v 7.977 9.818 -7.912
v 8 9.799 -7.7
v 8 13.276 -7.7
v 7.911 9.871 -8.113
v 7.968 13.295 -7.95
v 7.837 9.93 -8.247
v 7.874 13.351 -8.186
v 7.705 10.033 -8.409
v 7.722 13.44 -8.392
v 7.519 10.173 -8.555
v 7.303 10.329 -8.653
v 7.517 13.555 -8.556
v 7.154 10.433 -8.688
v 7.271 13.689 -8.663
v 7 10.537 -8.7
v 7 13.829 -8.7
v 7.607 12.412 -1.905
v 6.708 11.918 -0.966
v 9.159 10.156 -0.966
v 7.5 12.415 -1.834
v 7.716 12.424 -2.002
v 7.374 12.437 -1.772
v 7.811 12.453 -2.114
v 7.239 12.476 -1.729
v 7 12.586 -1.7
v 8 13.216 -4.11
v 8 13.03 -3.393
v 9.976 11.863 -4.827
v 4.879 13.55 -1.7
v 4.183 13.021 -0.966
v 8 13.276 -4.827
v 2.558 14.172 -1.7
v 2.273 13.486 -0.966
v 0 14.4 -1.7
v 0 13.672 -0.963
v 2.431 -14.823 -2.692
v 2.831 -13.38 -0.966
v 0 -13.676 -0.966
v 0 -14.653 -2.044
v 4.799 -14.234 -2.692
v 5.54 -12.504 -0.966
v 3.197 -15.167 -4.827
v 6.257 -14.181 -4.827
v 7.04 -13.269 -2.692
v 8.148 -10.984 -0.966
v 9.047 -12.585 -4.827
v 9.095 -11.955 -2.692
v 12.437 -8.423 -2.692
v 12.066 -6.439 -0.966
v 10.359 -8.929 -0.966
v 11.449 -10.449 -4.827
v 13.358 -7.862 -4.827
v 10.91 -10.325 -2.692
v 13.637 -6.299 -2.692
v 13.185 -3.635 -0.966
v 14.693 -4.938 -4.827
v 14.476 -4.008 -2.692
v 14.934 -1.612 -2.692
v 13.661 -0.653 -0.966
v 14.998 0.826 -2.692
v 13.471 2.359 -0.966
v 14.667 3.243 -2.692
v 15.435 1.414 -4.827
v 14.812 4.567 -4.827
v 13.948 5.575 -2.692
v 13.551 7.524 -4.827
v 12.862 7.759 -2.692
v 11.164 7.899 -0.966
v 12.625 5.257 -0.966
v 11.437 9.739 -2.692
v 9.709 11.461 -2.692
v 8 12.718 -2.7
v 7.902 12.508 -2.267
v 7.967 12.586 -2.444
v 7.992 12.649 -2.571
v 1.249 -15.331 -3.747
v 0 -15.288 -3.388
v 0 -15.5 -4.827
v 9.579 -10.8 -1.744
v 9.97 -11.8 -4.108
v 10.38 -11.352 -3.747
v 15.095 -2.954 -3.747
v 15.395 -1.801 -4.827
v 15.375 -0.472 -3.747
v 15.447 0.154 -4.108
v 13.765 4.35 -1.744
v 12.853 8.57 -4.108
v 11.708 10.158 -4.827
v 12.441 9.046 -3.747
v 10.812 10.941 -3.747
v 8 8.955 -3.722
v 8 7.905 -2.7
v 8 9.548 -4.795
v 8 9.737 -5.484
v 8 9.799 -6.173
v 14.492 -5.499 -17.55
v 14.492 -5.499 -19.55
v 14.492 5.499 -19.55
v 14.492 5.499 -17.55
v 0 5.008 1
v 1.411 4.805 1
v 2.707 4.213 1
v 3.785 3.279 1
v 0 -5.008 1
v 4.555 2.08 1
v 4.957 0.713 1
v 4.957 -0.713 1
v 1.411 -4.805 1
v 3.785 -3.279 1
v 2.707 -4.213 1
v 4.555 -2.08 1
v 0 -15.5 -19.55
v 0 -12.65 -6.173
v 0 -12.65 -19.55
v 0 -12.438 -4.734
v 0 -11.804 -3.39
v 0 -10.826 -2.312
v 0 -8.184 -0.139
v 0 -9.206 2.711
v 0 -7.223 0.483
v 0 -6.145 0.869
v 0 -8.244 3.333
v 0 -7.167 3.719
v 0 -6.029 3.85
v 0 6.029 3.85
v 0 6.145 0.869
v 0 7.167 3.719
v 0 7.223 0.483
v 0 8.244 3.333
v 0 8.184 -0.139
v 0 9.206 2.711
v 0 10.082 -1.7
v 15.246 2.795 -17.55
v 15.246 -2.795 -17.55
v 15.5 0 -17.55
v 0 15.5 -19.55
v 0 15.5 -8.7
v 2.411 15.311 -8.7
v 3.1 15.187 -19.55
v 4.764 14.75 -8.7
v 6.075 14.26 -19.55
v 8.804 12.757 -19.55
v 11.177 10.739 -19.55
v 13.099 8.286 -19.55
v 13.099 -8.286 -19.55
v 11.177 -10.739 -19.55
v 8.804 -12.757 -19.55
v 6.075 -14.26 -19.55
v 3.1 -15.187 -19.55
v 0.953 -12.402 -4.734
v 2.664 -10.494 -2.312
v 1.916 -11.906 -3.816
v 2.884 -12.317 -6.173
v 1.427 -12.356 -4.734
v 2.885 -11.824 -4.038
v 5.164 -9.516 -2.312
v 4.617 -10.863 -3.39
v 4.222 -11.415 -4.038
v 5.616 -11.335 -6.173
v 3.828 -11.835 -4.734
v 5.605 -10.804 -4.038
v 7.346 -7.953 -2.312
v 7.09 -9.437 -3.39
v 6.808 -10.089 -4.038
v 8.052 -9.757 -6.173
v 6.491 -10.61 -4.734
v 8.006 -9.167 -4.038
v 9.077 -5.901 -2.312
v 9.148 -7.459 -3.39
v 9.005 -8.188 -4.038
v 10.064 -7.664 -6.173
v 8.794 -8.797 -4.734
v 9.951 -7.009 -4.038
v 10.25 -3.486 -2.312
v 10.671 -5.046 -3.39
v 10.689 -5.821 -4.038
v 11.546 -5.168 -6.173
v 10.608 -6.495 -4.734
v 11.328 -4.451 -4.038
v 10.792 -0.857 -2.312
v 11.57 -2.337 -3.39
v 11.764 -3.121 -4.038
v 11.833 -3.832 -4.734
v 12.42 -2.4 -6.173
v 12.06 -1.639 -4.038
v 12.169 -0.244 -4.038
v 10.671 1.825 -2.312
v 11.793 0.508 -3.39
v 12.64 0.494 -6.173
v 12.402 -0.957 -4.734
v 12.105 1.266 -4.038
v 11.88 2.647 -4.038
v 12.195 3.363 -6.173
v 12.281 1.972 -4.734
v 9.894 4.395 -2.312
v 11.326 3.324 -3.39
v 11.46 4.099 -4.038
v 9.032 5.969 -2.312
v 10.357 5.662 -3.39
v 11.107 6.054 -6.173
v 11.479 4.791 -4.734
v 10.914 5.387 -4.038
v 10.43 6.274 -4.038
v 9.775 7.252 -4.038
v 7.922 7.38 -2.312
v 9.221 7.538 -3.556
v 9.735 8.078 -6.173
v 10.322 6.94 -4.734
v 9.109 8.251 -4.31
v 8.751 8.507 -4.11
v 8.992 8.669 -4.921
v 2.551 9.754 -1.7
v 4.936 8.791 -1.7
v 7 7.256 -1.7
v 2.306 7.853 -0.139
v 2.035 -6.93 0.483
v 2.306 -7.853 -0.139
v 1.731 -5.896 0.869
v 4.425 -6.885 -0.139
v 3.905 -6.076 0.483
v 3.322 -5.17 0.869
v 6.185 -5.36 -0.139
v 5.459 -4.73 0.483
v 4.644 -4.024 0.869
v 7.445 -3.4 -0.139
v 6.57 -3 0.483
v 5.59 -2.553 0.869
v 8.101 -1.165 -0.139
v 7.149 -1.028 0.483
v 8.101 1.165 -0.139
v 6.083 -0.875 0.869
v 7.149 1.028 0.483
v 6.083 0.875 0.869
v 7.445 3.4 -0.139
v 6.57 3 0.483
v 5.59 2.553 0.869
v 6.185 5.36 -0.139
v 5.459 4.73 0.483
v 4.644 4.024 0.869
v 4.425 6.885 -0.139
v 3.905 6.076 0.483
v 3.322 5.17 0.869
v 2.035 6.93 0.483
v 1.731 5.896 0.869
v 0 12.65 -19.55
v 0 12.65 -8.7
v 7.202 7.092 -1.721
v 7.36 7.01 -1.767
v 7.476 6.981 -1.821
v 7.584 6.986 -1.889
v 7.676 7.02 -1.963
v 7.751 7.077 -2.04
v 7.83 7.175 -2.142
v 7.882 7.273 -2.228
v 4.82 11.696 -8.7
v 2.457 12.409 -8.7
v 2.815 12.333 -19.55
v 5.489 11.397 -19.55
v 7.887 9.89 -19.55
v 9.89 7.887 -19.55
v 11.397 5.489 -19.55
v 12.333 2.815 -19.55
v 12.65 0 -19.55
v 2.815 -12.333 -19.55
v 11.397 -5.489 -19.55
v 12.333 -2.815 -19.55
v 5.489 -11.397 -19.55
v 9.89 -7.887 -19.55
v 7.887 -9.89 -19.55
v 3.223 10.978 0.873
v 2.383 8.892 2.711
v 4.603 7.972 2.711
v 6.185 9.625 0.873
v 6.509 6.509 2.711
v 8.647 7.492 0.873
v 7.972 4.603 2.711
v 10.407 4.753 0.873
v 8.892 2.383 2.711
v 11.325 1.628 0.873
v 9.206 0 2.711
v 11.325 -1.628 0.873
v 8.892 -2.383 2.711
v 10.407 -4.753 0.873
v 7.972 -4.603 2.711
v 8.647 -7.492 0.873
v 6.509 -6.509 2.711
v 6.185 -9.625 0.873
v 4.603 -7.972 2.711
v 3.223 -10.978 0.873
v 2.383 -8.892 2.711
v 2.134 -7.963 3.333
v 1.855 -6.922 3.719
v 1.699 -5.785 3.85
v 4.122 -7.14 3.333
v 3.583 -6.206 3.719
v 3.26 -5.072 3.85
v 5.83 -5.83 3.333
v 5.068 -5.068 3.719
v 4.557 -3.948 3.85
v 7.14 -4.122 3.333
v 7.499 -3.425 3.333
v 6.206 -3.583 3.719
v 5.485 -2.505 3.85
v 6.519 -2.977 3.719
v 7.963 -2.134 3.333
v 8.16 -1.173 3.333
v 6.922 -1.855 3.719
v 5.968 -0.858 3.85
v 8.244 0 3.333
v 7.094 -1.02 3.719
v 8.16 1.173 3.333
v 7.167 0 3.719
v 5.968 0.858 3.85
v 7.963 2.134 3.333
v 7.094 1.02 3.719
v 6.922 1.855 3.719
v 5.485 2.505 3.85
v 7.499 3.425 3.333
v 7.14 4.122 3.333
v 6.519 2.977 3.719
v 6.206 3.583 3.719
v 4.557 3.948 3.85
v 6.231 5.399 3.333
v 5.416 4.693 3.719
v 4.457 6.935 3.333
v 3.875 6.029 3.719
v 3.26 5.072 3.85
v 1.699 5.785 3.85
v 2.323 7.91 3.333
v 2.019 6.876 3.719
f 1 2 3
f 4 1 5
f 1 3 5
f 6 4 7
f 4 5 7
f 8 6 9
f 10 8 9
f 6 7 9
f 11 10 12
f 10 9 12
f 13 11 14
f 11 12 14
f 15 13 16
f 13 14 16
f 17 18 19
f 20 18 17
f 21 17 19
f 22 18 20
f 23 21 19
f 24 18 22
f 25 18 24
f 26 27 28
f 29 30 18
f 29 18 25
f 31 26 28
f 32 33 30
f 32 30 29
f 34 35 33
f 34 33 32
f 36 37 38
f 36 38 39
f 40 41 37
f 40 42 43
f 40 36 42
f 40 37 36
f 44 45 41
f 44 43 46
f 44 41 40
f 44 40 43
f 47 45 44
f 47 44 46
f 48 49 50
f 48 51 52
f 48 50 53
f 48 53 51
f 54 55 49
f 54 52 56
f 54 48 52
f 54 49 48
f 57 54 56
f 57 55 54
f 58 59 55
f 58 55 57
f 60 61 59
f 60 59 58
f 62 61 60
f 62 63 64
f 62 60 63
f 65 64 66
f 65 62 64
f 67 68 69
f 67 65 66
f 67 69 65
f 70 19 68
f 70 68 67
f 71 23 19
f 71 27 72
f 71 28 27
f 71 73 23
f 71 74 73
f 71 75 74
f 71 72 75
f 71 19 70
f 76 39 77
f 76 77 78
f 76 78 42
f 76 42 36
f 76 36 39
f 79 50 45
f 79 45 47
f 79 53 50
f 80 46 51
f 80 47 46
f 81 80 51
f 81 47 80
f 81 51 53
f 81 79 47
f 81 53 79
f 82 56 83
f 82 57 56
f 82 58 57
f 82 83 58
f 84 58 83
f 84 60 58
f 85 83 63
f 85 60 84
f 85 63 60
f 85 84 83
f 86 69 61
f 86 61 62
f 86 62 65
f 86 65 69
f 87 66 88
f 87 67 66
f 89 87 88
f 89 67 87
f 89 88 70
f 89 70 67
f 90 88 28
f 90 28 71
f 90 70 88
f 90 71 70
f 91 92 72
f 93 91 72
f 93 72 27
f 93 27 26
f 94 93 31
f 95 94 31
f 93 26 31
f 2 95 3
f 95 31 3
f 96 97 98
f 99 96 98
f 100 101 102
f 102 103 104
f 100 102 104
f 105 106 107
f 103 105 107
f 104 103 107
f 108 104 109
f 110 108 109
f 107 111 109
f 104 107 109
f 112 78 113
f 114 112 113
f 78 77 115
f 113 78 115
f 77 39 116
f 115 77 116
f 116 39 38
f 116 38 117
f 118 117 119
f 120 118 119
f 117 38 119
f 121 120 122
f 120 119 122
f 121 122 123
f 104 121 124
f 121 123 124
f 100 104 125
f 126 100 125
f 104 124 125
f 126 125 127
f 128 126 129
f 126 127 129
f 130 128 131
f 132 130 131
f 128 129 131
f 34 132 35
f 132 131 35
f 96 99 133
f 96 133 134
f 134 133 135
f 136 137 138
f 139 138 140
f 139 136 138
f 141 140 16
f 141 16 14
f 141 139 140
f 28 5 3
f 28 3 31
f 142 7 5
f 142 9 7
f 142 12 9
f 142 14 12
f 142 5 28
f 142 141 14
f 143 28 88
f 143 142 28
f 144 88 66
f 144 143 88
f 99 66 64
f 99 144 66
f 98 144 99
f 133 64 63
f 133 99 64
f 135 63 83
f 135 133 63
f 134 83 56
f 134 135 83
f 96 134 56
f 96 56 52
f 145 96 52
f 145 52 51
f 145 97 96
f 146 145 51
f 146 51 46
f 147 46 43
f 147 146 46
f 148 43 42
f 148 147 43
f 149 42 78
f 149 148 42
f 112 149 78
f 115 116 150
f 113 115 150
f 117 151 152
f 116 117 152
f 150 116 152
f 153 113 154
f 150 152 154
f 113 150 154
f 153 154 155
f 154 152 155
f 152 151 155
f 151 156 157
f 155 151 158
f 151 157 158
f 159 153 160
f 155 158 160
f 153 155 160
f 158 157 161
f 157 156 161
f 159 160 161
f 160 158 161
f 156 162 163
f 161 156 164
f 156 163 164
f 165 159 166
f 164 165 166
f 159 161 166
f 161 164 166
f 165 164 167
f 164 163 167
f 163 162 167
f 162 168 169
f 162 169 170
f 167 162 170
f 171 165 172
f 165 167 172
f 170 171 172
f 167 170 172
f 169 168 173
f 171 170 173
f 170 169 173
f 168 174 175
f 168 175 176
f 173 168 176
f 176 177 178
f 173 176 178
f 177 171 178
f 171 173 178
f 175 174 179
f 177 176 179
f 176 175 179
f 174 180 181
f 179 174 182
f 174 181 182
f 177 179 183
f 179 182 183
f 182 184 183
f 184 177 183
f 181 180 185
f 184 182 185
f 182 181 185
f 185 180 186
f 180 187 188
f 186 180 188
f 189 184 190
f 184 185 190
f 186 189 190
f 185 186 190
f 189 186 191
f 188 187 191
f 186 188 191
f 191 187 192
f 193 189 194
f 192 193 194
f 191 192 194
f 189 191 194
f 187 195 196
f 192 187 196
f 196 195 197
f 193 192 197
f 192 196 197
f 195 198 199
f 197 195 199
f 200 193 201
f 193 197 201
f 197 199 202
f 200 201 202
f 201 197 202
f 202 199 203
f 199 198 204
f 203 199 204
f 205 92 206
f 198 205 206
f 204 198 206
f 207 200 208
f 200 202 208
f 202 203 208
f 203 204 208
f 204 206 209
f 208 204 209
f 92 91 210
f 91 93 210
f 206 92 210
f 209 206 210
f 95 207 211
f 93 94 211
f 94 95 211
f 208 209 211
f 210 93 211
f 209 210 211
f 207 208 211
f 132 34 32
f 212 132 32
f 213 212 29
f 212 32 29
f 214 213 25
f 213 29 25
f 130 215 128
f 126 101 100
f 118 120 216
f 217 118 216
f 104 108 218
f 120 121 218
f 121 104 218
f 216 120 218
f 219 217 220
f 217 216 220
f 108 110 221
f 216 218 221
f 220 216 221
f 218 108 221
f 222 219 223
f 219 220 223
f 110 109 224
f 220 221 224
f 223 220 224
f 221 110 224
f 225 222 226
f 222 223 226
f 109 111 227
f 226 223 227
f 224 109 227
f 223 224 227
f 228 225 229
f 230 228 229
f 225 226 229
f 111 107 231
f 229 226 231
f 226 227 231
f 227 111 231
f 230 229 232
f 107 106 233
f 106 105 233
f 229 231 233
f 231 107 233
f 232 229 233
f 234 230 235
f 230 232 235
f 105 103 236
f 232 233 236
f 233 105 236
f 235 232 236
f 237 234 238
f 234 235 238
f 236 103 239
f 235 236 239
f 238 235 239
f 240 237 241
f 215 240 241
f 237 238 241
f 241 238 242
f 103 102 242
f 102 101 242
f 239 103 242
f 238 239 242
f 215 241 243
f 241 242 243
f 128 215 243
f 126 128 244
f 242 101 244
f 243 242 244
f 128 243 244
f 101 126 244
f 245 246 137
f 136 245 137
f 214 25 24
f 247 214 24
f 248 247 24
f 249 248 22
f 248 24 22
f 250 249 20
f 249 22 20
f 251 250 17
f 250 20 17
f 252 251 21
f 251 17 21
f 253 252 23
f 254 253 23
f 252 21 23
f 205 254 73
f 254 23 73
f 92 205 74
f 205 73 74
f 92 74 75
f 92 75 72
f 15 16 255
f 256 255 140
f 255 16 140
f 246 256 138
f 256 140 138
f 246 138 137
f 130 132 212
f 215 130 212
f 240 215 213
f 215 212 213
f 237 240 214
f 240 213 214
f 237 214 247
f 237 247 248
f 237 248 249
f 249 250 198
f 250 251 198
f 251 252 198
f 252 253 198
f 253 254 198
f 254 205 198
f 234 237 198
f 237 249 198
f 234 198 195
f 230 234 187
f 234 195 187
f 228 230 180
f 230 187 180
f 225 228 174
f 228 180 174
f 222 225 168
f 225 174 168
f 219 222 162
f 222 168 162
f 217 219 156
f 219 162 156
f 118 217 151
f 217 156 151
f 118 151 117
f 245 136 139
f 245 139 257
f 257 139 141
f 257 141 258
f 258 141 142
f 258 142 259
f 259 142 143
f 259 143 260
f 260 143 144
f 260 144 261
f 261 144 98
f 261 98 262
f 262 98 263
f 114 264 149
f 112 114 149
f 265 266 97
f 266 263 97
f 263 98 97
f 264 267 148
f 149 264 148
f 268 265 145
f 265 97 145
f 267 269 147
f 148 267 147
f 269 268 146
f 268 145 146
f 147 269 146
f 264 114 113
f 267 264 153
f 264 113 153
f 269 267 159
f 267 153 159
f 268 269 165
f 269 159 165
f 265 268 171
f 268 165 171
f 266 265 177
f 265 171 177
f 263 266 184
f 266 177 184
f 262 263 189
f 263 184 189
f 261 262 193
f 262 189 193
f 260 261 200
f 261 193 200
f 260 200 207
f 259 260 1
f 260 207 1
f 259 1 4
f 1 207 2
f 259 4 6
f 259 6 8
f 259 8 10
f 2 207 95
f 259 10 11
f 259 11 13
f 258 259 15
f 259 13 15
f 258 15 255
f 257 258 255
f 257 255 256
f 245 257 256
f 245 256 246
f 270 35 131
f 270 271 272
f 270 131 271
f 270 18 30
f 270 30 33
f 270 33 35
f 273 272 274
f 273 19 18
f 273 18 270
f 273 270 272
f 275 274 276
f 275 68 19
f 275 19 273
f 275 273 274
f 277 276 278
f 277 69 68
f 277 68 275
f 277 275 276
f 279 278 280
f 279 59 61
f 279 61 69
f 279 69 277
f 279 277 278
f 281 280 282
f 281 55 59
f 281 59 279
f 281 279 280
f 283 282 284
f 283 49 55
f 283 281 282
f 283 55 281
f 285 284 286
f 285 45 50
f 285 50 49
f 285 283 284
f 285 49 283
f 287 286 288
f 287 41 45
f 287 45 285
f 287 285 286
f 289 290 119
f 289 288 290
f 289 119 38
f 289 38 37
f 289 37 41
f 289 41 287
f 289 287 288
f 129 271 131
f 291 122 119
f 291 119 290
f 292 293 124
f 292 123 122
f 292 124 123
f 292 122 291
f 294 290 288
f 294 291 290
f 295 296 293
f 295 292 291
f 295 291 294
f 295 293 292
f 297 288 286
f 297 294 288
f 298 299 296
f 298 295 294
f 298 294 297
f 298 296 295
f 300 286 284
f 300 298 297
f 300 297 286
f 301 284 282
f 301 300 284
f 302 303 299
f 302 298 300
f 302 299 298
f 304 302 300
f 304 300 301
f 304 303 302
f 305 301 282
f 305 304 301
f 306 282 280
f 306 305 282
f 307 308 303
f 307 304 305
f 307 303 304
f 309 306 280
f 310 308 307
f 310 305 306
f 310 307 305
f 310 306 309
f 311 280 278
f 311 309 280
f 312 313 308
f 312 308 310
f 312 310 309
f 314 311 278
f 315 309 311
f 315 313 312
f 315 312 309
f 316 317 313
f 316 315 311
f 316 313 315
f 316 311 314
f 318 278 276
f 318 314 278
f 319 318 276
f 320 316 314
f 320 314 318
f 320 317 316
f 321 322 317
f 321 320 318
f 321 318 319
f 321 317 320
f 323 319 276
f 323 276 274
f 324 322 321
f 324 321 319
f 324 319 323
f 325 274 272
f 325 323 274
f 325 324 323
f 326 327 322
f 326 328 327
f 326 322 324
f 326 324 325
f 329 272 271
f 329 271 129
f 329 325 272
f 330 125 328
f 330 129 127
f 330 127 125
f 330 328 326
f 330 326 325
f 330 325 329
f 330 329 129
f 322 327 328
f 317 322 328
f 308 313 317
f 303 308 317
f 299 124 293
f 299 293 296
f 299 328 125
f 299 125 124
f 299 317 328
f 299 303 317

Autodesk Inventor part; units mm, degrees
ref_plane "YZ Plane" through (0, 0, 0) normal (1, 0, 0) x (0, 1, 0)
ref_plane "XZ Plane" through (0, 0, 0) normal (0, 1, 0) x (-1, 0, 0)
sketch "Эскиз1" plane through (0, 0, 0) normal (1, 0, 0) x (0, 1, 0)
  line L0 (0, 1) -> (-7.8216, 1)
  line L1 (-7.8216, 1) -> (-7.8216, 3.85)
  line L2 (-7.8216, 3.85) -> (0, 3.85)
  line L3 (0, 3.85) -> (0, 1)
  line L4 (-15.5, -46.55) -> (-15.5, -19.55)
  line L5 (-15.5, -19.55) -> (-12.65, -19.55)
  line L6 (-12.65, -19.55) -> (-12.65, -2.466)
  line L7 (-12.65, -2.466) -> (-15.5, -2.466)
  line L8 (-15.5, -2.466) -> (-15.5, -19.55)
  line L9 (-12.15, -9.434) -> (-12.15, -39.916)
  line L10 (-15.5, -2.466) -> (-7.8216, 3.85)
  line L11 (-7.8216, 3.85) -> (-6.0111, 1.649)
  line L12 (-6.0111, 1.649) -> (-13.6895, -4.6671)
  line L13 (-13.6895, -4.6671) -> (-15.5, -2.466)
  line L14 (-6.8, -2) -> (-6.8, -7.7)
  line L15 (0, -56.63) -> (0, 13.93) projected
  point P0 (0, 0)
  point P1 (-6.8, 1)
  point P2 (-12.65, -3.812)
  dimension "d0" = 0.5
  dimension "d1" = 2.85
  dimension "d2" = 2.85
  dimension "d3" = 50.56
  dimension "d4" = 0
  dimension "d5" = 1
  dimension "d6" = 2.85
  dimension "d7" = 0
revolve "Вращение1" add sketch "Эскиз1" angle 180 about axis through (0, 0, -10) along (0, 0, 1)
ref_plane "РабПлоскость1" through (7, 16.35, -7.7) normal (0, 1, 0) x (-1, 0, 0)
sketch "Эскиз2" plane through (7, 16.35, -7.7) normal (0, 1, 0) x (-1, 0, 0)
  line L0 (0, 0) -> (14, 0) projected
  line L1 (14, 0) -> (14, 5) projected
  line L2 (0, 5) -> (14, 5) projected
  line L3 (0, 0) -> (0, 5) projected
  line L4 (0, -1) -> (14, -1)
  line L5 (15, 0) -> (15, 5)
  line L6 (14, 6) -> (0, 6)
  line L7 (-1, 5) -> (-1, 0)
  arc A0 (-1, 0) -> (0, -1) centre (0, 0) ccw
  arc A1 (0, 6) -> (-1, 5) centre (0, 5) ccw
  arc A2 (15, 5) -> (14, 6) centre (14, 5) ccw
  arc A3 (14, -1) -> (15, 0) centre (14, 0) ccw
  point P0 (7, 7.7)
  dimension "d9" = 1
  dimension "d10" = 1
  dimension "d11" = 1
  dimension "d12" = 1
  dimension "d13" = 1
  dimension "d14" = 1
extrude "Выдавливание1" cut sketch "Эскиз2" against normal blind 10 contours L3 L2 L1 L0 | A0 L7 A1 L6 A2 L5 A3 L4
fillet "Сопряжение1" radius 5 4 edges at (7.8216, 0, 3.85) (14.938, -4.1361, -2.466) (6.8, 0, 1) (11.916, -4.2464, -3.812)
sketch "Эскиз3" plane through (0, -15.5, -19.55) normal (0, 0, -1) x (-1, 0, 0)
  line L0 (-14.4918, 10.0011) -> (-14.4918, 20.9989) projected
  arc A0 (-14.4918, 20.9989) -> (-14.4918, 10.0011) centre (0, 15.5) ccw projected
  point P0 (0, 15.5)
extrude "Выдавливание2" cut sketch "Эскиз3" against normal blind 2
properties part number "EncCoverHalf" material "Пластик ПАЭК"
